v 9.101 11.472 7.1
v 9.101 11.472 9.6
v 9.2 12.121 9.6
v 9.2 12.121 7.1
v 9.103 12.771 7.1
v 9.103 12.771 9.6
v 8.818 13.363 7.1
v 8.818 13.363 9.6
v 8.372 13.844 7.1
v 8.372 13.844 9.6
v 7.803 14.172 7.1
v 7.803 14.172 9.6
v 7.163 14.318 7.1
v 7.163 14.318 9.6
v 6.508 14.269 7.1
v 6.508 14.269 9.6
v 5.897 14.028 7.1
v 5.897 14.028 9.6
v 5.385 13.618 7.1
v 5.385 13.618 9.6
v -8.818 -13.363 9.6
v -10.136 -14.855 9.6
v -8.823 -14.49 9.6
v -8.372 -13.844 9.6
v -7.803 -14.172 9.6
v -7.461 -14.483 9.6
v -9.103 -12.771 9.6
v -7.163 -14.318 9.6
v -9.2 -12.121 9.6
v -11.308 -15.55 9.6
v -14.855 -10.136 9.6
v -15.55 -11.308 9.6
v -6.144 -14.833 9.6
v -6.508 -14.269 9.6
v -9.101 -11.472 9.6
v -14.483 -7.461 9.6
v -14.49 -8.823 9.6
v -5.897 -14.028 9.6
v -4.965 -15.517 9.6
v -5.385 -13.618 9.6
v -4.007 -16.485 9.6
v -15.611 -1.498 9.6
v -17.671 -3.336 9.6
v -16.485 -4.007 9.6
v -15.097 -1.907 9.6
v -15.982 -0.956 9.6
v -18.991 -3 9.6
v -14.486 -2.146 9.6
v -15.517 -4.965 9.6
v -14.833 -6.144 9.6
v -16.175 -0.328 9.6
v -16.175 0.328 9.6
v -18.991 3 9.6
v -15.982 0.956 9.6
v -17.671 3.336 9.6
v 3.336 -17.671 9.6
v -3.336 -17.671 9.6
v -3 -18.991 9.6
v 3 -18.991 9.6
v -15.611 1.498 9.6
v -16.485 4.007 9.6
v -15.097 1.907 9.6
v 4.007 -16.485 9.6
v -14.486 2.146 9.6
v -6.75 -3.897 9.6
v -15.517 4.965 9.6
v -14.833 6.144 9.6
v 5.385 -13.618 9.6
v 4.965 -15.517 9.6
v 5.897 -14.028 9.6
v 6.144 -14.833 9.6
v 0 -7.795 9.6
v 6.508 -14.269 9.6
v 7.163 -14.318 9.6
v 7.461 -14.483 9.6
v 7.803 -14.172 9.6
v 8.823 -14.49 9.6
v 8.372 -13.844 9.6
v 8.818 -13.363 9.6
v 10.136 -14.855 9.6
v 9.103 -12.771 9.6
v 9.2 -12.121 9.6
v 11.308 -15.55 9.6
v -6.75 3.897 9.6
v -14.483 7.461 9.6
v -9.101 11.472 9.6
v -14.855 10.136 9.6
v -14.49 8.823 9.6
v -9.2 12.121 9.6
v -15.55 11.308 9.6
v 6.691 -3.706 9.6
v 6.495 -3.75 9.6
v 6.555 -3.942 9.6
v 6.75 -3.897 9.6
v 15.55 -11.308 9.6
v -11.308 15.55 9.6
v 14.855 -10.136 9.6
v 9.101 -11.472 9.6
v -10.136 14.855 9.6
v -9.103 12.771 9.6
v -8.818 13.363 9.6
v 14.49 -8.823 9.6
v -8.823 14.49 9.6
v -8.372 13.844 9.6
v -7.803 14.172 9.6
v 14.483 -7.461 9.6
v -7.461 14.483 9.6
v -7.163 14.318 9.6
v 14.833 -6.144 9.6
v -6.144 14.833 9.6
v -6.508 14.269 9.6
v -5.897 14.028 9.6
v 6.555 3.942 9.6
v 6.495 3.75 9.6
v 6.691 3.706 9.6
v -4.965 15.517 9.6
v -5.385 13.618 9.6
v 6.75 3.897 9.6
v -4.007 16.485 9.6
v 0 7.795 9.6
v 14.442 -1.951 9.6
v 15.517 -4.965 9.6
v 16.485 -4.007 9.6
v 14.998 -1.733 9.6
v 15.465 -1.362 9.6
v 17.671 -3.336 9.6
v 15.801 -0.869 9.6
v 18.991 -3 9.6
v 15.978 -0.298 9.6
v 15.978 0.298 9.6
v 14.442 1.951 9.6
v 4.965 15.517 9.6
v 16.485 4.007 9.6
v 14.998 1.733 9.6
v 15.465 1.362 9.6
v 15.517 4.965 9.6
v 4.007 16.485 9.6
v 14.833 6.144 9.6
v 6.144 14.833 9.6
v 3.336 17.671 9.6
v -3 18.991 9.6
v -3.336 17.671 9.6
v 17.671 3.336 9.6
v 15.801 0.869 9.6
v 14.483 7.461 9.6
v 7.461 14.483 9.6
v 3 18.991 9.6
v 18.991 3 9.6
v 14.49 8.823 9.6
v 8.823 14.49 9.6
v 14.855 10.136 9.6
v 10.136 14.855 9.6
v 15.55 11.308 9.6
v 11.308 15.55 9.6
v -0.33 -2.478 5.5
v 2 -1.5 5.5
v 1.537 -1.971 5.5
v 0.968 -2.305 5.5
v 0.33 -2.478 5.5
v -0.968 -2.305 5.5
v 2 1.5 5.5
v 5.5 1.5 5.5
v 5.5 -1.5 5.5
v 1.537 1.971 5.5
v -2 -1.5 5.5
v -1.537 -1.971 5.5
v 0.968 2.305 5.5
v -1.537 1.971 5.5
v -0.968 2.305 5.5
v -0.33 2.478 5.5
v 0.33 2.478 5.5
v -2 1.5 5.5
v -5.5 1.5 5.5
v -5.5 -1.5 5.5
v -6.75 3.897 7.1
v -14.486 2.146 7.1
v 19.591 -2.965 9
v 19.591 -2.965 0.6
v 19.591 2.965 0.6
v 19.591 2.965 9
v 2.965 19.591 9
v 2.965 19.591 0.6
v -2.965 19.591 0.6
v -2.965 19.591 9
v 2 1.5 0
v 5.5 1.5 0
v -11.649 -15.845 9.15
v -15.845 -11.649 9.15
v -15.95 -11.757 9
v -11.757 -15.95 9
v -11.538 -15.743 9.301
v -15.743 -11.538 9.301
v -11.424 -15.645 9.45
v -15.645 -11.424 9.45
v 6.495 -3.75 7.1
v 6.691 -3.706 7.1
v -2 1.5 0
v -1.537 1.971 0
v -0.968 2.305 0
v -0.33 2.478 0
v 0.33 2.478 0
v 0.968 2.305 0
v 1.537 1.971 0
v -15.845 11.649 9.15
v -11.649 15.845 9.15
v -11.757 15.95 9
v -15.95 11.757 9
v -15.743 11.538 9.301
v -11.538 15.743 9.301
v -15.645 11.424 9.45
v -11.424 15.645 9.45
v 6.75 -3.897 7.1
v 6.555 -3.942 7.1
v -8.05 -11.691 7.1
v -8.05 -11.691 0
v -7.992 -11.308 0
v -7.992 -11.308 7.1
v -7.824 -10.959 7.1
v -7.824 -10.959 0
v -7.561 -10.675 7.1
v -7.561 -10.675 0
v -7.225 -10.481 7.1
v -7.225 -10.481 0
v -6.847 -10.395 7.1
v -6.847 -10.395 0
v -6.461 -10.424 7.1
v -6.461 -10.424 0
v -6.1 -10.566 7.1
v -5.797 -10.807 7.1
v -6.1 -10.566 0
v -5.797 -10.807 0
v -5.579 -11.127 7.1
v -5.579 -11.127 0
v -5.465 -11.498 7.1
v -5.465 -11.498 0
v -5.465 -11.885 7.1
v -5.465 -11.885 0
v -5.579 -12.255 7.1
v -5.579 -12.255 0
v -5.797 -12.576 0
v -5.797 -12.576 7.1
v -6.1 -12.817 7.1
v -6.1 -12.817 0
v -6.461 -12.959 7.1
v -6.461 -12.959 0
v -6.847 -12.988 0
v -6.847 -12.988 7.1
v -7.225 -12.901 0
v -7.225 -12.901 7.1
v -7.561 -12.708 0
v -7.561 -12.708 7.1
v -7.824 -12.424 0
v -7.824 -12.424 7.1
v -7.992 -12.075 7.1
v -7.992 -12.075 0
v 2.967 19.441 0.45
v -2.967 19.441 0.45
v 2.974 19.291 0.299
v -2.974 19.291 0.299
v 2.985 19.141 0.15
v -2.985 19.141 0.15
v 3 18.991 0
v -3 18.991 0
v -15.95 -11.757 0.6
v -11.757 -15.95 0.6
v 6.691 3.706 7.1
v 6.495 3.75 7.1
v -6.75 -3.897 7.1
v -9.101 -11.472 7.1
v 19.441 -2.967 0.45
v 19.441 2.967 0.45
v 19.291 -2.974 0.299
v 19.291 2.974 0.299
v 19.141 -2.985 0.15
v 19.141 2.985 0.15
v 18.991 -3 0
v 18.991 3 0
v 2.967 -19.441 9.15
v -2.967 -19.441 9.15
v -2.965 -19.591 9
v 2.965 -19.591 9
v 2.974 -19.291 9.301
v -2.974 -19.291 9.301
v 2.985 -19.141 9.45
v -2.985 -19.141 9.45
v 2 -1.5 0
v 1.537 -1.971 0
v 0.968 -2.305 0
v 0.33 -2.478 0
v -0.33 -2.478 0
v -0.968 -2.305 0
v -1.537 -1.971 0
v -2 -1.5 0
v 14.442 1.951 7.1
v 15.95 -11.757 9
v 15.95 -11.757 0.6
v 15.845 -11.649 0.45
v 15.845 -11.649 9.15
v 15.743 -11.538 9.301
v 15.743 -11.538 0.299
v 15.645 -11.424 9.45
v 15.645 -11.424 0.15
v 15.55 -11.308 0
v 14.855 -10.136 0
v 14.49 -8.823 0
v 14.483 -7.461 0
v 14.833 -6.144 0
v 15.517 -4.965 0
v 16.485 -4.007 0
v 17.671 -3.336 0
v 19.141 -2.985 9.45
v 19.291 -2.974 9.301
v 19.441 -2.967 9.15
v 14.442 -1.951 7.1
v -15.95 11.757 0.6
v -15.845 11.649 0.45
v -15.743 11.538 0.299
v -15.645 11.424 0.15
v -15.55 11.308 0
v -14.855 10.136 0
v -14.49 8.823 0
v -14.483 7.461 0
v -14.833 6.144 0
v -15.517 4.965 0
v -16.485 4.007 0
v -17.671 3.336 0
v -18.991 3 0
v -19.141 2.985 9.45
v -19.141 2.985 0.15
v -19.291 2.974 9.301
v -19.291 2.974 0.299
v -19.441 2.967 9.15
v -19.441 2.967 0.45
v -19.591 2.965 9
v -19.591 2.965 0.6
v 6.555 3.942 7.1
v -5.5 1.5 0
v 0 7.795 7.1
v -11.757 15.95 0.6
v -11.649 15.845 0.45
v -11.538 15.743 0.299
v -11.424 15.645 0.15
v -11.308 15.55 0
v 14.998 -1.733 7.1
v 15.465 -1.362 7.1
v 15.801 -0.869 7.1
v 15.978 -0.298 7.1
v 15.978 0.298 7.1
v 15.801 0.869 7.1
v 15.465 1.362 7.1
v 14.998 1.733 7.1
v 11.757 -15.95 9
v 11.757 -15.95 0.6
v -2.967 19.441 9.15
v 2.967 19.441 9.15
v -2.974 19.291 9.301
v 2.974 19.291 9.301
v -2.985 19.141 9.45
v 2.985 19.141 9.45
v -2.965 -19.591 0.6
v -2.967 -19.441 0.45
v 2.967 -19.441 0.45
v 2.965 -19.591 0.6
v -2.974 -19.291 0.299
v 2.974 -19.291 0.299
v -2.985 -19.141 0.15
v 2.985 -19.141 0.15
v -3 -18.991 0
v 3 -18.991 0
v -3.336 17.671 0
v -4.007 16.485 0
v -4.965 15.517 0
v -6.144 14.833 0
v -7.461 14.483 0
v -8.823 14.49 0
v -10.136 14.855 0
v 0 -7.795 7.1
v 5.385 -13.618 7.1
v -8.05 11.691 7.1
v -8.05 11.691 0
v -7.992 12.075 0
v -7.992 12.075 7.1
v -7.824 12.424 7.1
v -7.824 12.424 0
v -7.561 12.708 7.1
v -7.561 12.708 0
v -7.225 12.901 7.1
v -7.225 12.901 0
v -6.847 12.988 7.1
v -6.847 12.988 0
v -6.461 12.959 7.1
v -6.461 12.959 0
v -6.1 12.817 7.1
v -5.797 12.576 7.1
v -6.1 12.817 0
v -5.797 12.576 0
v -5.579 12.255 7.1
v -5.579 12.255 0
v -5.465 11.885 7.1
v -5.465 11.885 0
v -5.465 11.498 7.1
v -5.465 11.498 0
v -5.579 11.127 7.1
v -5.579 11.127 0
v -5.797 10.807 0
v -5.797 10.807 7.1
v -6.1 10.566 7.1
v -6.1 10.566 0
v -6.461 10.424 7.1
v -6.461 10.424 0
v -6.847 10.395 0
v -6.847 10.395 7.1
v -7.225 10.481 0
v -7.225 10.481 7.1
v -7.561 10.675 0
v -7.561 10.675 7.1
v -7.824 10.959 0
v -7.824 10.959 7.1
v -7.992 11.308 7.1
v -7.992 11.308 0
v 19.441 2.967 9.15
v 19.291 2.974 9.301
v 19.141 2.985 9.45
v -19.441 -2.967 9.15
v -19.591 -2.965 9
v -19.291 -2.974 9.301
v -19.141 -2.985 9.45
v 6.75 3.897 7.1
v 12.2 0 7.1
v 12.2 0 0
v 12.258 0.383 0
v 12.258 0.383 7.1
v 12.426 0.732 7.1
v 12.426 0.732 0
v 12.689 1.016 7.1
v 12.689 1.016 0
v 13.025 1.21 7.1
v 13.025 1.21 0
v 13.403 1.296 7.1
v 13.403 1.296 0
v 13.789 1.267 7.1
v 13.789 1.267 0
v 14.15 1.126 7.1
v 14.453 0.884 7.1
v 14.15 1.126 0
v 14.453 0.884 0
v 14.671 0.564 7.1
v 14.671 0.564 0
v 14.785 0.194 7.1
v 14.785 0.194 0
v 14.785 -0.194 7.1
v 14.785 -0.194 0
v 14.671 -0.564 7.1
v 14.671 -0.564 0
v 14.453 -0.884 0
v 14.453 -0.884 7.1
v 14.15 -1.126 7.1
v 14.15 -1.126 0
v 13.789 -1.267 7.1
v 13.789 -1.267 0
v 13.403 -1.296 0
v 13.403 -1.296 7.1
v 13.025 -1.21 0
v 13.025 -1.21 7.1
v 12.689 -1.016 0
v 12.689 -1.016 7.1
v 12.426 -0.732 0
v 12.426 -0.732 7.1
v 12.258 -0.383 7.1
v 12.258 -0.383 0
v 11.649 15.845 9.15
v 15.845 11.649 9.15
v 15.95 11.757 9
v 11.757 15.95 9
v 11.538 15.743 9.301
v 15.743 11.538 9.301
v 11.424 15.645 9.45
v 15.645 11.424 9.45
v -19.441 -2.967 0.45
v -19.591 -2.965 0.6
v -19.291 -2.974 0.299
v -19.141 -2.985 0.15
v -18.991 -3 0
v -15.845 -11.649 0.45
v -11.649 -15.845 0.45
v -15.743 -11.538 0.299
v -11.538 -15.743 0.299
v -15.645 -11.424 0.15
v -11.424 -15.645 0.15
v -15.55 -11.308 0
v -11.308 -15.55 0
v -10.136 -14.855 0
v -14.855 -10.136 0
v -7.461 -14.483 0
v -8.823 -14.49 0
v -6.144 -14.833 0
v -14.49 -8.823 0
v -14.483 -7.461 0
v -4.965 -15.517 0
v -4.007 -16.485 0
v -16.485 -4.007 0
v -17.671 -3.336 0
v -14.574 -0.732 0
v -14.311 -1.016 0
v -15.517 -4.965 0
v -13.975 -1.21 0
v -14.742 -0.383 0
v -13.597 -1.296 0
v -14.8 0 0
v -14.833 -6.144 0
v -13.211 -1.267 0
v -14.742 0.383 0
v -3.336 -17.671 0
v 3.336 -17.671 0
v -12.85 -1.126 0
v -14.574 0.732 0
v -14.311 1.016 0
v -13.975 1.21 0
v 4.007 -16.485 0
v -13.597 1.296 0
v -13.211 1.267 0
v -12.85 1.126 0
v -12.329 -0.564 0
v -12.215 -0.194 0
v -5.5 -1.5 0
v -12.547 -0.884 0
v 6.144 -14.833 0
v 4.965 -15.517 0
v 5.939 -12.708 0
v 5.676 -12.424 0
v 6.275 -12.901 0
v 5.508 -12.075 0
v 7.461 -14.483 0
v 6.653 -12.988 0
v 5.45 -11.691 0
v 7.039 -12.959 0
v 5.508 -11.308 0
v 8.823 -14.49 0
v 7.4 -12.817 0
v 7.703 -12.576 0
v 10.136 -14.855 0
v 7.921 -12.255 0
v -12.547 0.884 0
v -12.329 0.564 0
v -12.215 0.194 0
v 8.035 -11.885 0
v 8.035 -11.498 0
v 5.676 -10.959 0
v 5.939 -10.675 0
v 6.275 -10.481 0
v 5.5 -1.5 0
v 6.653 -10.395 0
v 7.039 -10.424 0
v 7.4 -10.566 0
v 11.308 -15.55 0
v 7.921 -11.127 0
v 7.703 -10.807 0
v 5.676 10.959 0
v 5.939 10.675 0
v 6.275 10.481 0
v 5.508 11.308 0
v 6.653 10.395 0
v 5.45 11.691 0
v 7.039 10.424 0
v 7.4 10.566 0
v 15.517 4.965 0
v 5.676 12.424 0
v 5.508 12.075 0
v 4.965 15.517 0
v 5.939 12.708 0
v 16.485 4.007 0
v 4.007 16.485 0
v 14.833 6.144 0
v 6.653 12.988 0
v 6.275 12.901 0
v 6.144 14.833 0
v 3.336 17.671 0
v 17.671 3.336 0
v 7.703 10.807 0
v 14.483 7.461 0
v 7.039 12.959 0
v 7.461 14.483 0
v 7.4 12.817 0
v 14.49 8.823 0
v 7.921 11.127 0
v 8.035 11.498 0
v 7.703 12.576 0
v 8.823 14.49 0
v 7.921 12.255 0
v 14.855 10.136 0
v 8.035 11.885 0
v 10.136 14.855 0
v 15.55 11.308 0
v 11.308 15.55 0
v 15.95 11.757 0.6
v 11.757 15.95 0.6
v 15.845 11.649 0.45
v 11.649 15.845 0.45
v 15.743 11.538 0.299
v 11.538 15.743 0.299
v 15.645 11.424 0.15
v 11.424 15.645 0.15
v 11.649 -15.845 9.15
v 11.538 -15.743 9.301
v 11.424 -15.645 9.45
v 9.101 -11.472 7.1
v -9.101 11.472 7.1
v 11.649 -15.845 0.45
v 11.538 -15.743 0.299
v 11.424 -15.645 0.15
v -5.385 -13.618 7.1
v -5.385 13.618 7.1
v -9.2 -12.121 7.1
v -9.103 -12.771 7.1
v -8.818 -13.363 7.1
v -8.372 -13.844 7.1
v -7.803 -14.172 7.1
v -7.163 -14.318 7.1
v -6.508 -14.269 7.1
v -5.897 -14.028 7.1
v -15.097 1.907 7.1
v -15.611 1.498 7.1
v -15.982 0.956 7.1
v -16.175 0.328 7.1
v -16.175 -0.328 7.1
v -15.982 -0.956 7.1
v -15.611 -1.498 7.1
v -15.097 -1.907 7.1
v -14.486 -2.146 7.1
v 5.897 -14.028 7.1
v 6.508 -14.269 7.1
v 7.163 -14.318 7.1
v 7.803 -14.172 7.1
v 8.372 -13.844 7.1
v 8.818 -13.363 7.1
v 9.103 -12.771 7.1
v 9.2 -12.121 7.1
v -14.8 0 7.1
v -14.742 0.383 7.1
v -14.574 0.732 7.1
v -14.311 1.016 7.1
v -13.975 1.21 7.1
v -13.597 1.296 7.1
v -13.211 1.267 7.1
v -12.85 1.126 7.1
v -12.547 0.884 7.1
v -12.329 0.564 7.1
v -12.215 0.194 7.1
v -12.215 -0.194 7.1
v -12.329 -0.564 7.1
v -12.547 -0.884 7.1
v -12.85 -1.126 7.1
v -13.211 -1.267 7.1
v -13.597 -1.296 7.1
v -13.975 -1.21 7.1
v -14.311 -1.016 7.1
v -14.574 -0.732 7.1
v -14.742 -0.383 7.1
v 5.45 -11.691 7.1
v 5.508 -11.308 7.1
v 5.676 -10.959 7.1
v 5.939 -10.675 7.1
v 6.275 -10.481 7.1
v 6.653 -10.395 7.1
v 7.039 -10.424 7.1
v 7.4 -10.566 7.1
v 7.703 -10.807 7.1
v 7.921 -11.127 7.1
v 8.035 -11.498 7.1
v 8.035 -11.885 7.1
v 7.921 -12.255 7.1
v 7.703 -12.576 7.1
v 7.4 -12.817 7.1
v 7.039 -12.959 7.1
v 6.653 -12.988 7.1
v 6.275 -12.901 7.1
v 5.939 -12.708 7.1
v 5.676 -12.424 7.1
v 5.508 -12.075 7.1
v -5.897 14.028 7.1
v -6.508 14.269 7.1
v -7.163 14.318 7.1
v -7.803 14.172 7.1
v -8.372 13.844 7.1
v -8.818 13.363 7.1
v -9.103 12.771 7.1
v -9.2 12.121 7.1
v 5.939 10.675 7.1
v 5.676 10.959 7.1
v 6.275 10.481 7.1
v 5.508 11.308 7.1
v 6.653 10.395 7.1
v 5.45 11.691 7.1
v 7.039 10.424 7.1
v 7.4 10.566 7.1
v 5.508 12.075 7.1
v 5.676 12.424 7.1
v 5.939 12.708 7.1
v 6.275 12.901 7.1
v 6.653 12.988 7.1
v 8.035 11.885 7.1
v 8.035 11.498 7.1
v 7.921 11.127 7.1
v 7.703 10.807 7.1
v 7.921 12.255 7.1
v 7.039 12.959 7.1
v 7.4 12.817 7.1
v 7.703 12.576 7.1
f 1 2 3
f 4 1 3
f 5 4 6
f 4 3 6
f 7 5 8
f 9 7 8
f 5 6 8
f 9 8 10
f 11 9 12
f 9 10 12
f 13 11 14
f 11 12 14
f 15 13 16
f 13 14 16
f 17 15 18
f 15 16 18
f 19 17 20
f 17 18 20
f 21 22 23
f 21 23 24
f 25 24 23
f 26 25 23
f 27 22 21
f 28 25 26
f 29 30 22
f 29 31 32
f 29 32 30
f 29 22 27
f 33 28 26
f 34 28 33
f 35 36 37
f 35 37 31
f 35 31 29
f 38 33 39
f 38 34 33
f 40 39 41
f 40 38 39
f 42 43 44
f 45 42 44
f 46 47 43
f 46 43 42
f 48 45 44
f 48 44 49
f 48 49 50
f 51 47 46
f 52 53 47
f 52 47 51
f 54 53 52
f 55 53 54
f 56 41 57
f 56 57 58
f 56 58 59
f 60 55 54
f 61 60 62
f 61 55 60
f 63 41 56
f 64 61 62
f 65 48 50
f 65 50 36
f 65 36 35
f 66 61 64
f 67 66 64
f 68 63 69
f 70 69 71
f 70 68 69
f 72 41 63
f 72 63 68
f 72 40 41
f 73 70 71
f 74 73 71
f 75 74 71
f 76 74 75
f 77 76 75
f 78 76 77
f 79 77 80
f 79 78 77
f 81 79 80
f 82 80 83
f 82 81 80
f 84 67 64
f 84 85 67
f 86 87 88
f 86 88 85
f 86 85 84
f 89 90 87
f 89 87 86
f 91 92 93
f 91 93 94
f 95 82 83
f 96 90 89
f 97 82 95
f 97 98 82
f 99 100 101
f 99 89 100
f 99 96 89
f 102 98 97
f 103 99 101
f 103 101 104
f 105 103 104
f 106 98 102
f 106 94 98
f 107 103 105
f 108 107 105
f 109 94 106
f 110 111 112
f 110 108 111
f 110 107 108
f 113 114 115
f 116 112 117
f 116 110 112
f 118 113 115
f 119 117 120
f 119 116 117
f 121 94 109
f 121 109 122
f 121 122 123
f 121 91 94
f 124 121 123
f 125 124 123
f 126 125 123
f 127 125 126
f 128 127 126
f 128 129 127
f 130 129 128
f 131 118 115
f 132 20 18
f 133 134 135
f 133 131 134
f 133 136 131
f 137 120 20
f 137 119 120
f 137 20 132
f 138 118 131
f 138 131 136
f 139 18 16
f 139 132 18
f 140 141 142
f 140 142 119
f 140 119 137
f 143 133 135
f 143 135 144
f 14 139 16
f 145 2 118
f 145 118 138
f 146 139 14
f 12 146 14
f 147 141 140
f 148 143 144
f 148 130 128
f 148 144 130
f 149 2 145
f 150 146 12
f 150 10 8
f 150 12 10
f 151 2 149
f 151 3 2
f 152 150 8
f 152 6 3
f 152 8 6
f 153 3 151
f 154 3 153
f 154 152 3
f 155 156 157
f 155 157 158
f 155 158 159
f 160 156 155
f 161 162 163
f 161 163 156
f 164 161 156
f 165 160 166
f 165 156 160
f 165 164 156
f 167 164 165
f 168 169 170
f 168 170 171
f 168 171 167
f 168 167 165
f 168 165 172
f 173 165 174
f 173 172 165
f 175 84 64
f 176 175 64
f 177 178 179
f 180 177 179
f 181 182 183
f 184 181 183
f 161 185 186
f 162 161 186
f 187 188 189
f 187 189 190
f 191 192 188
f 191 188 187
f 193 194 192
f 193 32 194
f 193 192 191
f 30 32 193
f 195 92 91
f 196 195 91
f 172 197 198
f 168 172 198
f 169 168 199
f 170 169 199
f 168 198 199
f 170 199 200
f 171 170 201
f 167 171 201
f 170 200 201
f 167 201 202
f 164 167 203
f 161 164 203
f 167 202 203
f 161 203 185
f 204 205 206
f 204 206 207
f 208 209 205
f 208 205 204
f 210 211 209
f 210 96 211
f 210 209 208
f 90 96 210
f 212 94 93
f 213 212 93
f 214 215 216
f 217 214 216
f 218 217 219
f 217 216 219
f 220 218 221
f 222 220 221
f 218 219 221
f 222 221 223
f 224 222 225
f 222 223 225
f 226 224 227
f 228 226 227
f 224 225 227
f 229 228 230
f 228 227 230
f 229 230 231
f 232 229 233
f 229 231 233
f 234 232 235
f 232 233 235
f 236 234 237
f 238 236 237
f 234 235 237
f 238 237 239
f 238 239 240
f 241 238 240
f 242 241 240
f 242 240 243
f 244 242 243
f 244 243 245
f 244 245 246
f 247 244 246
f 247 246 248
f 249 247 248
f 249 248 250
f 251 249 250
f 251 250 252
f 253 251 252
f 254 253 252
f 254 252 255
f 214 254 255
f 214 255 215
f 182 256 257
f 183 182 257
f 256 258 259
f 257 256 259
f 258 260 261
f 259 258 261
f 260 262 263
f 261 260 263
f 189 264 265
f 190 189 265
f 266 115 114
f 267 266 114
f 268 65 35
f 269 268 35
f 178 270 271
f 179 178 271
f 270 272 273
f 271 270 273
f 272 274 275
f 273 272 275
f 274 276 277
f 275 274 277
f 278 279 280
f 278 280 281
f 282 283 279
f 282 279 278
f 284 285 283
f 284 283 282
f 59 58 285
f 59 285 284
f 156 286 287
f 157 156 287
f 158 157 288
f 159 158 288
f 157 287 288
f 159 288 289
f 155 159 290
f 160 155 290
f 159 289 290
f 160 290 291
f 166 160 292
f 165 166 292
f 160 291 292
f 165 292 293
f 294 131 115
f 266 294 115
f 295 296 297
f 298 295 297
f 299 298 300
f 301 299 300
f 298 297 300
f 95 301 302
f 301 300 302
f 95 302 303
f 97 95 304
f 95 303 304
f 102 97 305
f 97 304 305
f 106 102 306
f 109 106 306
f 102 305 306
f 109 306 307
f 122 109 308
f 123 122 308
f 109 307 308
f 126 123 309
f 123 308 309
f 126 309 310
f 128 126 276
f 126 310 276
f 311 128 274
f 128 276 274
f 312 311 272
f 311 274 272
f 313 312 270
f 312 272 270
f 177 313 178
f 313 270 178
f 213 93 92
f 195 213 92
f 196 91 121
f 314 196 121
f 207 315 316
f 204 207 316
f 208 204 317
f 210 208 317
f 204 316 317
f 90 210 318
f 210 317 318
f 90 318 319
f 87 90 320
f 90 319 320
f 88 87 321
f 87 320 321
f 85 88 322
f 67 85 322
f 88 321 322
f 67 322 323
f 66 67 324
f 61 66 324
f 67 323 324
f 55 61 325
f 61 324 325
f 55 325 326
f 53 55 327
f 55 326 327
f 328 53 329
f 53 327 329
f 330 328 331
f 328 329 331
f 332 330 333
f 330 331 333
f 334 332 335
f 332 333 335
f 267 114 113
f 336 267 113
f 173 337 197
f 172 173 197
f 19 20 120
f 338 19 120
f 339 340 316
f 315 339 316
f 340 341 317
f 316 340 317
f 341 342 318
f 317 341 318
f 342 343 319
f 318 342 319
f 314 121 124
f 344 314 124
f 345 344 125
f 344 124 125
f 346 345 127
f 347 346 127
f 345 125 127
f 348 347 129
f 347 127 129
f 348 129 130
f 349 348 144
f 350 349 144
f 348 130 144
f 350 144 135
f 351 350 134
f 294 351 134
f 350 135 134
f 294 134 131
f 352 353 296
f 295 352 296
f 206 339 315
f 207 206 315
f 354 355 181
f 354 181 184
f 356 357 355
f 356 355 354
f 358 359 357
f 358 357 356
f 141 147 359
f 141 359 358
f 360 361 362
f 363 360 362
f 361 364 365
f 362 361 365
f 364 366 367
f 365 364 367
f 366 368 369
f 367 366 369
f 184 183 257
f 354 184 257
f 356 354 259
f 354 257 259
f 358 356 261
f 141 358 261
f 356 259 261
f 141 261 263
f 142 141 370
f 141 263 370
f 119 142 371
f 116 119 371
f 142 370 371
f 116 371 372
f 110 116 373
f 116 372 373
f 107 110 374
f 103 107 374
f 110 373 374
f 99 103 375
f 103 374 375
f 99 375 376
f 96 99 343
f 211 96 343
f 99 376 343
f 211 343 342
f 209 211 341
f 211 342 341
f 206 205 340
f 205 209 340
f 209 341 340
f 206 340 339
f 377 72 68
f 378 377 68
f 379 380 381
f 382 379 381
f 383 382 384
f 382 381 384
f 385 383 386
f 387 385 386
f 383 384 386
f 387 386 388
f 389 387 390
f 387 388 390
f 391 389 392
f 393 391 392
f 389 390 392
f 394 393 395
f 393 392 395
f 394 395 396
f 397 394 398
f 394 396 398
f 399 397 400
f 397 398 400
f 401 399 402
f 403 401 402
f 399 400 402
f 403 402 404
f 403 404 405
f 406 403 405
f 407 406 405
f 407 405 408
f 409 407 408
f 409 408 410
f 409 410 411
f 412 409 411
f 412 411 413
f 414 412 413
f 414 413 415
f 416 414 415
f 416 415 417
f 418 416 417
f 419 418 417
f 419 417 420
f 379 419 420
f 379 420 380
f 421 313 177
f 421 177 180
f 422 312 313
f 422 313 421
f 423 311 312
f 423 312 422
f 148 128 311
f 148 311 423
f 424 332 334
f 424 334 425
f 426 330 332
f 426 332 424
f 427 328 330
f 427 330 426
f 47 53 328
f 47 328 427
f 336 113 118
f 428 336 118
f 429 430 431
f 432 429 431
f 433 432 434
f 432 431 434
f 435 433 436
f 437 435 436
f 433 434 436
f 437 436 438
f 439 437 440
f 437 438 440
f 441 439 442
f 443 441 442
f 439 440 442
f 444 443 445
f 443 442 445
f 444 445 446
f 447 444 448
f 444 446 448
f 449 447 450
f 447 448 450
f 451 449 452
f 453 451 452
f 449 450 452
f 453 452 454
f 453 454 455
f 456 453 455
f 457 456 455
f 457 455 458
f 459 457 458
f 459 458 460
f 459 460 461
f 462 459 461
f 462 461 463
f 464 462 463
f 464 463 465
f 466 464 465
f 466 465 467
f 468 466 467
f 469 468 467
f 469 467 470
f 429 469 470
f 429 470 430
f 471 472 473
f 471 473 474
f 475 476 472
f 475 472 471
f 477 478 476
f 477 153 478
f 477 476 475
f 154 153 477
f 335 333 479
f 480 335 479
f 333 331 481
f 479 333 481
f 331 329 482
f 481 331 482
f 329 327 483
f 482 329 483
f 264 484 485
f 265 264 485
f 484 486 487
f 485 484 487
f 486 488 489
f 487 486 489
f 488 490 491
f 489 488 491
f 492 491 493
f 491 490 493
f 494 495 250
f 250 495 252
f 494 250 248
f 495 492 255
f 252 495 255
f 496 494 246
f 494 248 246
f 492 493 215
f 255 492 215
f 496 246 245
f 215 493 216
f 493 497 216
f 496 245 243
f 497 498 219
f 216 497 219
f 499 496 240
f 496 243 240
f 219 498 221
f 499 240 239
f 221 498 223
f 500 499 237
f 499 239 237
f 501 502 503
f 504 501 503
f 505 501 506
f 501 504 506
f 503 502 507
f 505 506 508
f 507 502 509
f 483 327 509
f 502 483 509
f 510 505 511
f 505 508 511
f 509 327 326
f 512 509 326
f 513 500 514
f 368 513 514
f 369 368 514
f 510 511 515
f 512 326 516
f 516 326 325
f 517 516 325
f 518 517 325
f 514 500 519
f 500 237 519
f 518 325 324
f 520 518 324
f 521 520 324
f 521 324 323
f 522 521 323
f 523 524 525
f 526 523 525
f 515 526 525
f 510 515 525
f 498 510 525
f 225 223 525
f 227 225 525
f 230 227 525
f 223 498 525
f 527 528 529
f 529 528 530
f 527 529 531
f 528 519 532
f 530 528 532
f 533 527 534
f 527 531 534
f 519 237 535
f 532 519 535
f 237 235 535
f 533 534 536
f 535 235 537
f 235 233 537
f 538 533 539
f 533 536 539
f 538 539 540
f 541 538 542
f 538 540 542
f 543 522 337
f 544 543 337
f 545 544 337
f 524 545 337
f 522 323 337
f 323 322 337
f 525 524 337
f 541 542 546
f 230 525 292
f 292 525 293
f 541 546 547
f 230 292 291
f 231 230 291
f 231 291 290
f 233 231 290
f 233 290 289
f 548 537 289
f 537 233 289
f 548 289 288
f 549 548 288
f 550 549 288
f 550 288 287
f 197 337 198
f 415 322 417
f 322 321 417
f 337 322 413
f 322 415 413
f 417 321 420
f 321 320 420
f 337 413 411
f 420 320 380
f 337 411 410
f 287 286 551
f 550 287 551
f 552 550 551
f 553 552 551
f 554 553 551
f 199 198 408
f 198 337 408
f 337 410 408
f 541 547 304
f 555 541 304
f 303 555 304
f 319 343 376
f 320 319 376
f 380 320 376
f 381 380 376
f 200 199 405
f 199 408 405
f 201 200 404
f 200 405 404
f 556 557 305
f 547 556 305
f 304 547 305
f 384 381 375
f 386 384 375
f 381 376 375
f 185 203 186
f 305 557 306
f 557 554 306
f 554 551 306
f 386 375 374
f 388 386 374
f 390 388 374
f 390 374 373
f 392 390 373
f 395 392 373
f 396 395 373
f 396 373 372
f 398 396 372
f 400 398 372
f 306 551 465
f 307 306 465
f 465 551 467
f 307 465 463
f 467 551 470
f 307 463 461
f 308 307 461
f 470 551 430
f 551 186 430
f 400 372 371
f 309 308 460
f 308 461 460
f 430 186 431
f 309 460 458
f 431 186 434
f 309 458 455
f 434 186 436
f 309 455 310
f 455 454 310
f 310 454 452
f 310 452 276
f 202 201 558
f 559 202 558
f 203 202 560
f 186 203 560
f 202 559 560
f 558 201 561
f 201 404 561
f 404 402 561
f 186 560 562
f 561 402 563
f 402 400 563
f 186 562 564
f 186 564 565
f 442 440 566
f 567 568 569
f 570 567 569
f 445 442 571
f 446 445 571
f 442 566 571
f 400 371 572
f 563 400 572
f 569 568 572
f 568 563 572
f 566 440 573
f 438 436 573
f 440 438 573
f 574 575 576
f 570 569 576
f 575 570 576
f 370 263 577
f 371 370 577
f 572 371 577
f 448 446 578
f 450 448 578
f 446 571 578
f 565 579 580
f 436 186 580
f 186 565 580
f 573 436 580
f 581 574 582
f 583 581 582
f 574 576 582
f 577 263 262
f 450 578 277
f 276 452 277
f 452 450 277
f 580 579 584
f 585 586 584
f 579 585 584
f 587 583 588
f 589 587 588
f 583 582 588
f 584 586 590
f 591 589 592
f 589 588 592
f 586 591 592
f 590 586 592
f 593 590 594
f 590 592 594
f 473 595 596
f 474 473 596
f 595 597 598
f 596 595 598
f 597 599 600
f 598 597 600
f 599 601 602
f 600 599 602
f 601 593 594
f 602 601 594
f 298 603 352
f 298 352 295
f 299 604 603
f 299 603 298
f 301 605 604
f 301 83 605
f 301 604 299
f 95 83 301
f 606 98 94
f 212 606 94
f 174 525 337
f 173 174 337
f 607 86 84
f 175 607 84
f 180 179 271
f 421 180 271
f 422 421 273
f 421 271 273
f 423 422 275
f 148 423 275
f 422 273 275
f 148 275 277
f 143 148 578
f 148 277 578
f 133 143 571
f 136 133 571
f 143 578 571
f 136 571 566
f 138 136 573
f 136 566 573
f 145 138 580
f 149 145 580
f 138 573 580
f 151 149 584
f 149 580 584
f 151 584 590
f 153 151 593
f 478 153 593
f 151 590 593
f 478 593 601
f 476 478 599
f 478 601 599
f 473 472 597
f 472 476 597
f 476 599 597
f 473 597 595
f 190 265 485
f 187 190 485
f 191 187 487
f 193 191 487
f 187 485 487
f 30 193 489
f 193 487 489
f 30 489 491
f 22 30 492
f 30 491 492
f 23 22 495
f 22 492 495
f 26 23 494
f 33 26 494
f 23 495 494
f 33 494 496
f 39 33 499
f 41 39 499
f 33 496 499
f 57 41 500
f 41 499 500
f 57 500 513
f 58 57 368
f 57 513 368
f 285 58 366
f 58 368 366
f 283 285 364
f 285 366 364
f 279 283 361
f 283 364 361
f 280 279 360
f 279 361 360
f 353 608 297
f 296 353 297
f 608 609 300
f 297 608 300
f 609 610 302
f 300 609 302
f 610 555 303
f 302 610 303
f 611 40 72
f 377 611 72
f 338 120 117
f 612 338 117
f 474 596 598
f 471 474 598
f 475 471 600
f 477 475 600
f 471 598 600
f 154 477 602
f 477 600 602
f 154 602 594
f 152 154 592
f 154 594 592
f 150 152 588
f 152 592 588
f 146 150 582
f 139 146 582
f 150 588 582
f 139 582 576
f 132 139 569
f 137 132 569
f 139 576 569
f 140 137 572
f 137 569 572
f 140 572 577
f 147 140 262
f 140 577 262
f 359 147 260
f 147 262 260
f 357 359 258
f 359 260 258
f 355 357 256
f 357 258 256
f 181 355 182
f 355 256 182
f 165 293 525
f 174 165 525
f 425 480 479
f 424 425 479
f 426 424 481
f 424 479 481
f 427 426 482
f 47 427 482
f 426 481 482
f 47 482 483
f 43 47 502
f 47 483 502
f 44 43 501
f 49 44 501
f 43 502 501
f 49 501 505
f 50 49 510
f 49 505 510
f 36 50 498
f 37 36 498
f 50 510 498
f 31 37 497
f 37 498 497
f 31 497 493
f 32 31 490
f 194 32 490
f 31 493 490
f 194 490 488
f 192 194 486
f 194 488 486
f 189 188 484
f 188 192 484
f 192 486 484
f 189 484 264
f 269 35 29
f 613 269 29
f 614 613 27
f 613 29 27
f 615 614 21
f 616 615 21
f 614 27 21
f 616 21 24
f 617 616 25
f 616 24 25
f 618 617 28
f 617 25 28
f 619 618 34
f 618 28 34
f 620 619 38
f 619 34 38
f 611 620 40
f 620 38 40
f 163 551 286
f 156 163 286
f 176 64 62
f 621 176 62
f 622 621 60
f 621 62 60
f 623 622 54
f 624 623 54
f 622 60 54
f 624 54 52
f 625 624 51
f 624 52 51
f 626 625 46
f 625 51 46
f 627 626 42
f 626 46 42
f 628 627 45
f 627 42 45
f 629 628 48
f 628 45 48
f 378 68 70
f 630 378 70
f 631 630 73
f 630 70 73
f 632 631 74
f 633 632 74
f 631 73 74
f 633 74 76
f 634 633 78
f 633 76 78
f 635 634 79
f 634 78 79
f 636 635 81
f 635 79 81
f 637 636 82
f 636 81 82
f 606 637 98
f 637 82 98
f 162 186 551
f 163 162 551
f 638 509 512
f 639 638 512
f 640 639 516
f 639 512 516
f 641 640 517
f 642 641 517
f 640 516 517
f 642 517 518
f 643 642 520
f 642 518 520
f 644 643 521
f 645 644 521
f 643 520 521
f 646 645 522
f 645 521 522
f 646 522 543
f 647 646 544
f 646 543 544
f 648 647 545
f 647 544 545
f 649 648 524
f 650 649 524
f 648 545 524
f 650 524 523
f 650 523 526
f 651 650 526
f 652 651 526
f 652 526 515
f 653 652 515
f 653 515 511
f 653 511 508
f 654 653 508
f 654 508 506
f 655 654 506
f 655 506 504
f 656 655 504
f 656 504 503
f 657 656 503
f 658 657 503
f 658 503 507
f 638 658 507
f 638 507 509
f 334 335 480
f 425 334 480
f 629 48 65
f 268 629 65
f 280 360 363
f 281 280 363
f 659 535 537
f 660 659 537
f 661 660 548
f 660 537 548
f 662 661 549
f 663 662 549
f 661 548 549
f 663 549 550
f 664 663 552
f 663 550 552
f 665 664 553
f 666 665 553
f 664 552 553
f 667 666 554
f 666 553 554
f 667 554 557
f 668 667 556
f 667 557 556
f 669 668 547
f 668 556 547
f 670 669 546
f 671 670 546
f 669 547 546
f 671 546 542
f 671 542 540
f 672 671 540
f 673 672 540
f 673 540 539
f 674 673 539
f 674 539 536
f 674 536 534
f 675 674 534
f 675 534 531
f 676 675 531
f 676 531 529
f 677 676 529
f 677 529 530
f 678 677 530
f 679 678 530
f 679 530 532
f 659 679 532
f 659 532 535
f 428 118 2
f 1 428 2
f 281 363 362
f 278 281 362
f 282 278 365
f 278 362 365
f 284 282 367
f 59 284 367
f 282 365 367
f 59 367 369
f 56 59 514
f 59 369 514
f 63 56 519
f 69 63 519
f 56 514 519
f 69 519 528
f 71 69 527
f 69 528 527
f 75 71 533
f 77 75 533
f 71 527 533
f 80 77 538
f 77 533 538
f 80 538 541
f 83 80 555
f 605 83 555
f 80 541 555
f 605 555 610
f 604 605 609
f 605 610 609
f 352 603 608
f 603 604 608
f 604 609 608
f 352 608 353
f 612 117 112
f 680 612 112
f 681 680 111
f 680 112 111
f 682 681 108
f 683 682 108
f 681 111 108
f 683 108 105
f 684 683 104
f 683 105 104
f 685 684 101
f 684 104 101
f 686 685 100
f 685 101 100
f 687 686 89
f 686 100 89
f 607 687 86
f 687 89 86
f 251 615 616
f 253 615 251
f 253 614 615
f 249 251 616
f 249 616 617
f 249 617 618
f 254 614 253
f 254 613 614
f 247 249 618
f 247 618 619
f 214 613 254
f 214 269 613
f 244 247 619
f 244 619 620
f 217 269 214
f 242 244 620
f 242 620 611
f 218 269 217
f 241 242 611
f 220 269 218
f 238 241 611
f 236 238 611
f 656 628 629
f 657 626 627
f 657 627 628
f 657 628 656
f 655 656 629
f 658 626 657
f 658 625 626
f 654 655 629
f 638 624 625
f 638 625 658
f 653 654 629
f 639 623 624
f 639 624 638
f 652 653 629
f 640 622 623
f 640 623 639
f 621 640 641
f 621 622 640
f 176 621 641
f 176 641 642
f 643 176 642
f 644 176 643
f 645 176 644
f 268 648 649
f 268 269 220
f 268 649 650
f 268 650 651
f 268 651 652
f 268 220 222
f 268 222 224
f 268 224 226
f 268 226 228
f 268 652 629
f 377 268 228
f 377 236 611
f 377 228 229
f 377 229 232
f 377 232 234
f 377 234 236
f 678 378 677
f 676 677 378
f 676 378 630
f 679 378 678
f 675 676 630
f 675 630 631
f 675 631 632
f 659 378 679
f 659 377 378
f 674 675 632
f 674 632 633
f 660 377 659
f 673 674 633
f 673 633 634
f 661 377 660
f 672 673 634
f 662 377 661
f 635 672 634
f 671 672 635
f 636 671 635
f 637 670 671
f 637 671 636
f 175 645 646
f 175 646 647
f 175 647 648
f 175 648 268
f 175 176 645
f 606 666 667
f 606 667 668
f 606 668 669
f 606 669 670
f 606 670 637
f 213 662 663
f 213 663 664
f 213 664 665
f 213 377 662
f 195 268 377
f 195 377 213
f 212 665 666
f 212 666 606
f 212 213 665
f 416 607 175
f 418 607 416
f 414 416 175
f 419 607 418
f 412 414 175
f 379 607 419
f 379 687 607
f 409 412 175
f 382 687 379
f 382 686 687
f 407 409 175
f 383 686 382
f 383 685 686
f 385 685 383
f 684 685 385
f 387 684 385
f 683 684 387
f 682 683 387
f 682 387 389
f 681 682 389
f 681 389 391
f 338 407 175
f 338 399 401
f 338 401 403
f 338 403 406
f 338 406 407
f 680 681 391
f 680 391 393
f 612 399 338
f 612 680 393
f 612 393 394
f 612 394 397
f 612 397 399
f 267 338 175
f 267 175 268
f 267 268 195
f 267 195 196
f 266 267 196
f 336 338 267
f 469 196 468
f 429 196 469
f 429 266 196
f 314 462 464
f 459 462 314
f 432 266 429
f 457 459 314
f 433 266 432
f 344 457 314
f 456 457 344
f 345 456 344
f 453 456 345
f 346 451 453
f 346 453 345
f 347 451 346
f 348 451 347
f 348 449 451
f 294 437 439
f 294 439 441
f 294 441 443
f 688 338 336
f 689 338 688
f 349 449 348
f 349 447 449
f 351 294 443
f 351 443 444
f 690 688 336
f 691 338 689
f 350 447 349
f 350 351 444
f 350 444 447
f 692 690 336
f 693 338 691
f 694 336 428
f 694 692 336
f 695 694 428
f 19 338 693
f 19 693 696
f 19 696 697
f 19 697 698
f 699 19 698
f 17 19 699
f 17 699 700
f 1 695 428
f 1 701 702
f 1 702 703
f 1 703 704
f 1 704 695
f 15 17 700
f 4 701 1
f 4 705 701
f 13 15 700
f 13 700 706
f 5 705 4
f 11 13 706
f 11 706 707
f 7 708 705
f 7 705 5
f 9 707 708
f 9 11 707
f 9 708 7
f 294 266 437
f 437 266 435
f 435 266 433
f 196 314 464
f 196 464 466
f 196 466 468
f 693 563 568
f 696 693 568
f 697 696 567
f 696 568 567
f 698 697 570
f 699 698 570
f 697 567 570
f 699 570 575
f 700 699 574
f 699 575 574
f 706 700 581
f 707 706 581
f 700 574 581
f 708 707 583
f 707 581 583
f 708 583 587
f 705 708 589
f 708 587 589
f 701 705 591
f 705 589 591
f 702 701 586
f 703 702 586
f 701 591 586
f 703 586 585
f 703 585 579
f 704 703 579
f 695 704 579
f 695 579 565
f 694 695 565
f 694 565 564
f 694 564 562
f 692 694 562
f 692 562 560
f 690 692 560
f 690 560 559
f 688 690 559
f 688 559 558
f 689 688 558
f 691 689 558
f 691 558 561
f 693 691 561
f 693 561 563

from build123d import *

# Parameters (mm, degrees)
BOSS_EXTRUDE1_DEPTH  = 9.6
CHAMFER2_SIZE        = 0.6
CUT_EXTRUDE2_DEPTH   = 2.5
M2_CLEARANCE_HOLE1_D = 2.6
CUT_EXTRUDE3_START   = -9.6
CUT_EXTRUDE3_DEPTH   = 5.5


with BuildPart() as part:
    # Sketch1 → Boss-Extrude1 (new body)
    with BuildSketch(Plane.XY):
        with BuildLine():
            ThreePointArc((-11.756599923, -15.949743136), (-6.144180323, -14.833363466), (-2.965, -19.591343059))
            Line((-2.965, -19.591343059), (2.965, -19.591343059))
            ThreePointArc((2.965, -19.591343059), (6.144180323, -14.833363466), (11.756599923, -15.949743136))
            Line((11.756599923, -15.949743136), (15.949743136, -11.756599923))
            ThreePointArc((15.949743136, -11.756599923), (14.833363466, -6.144180323), (19.591343059, -2.965))
            Line((19.591343059, -2.965), (19.591343059, 2.965))
            ThreePointArc((19.591343059, 2.965), (14.833363466, 6.144180323), (15.949743136, 11.756599923))
            Line((15.949743136, 11.756599923), (11.756599923, 15.949743136))
            ThreePointArc((11.756599923, 15.949743136), (6.144180323, 14.833363466), (2.965, 19.591343059))
            Line((2.965, 19.591343059), (-2.965, 19.591343059))
            ThreePointArc((-2.965, 19.591343059), (-6.144180323, 14.833363466), (-11.756599923, 15.949743136))
            Line((-11.756599923, 15.949743136), (-15.949743136, 11.756599923))
            ThreePointArc((-15.949743136, 11.756599923), (-14.833363466, 6.144180323), (-19.591343059, 2.965))
            Line((-19.591343059, 2.965), (-19.591343059, -2.965))
            ThreePointArc((-19.591343059, -2.965), (-14.833363466, -6.144180323), (-15.949743136, -11.756599923))
            Line((-15.949743136, -11.756599923), (-11.756599923, -15.949743136))
        make_face()
    extrude(amount=BOSS_EXTRUDE1_DEPTH)

    # Chamfer2
    chamfer2_edges = [part.edges().sort_by_distance(p)[0] for p in [
        (-19.591343059, 0, 9.6),
        (-13.853171529, 13.853171529, 0),
        (0, 19.591343059, 0),
        (13.853171529, 13.853171529, 0),
        (19.591343059, 0, 0),
        (-13.853171529, -13.853171529, 9.6),
        (13.853171529, -13.853171529, 0),
        (0, -19.591343059, 0),
        (-13.853171529, -13.853171529, 0),
        (-19.591343059, 0, 0),
        (0, -19.591343059, 9.6),
        (13.853171529, -13.853171529, 9.6),
        (19.591343059, 0, 9.6),
        (13.853171529, 13.853171529, 9.6),
        (0, 19.591343059, 9.6),
        (-13.853171529, 13.853171529, 9.6),
    ]]
    chamfer(chamfer2_edges, length=CHAMFER2_SIZE)

    # Sketch4 → Cut-Extrude2 (cut)
    with BuildSketch(Plane.XY.offset(9.6)):
        with BuildLine():
            ThreePointArc((14.441692106, -1.95061736), (16, 0), (14.441692106, 1.95061736))
            Line((14.441692106, 1.95061736), (6.69085075, 3.70569527))
            Line((6.69085075, 3.70569527), (6.495190528, 3.75))
            Line((6.495190528, 3.75), (6.554651618, 3.941599088))
            Line((6.554651618, 3.941599088), (6.750311839, 3.897294358))
            Line((6.750311839, 3.897294358), (9.101143263, 11.472284348))
            ThreePointArc((9.101143263, 11.472284348), (8.1, 14.029611541), (5.384718053, 13.617963443))
            Line((5.384718053, 13.617963443), (0, 7.794588715))
            Line((0, 7.794588715), (-5.384718053, 13.617963443))
            ThreePointArc((-5.384718053, 13.617963443), (-8.1, 14.029611541), (-9.101143263, 11.472284348))
            Line((-9.101143263, 11.472284348), (-6.750311839, 3.897294358))
            Line((-6.750311839, 3.897294358), (-14.485861316, 2.145679096))
            ThreePointArc((-14.485861316, 2.145679096), (-16.2, 0), (-14.485861316, -2.145679096))
            Line((-14.485861316, -2.145679096), (-6.750311839, -3.897294358))
            Line((-6.750311839, -3.897294358), (-9.101143263, -11.472284348))
            ThreePointArc((-9.101143263, -11.472284348), (-8.1, -14.029611541), (-5.384718053, -13.617963443))
            Line((-5.384718053, -13.617963443), (0, -7.794588715))
            Line((0, -7.794588715), (5.384718053, -13.617963443))
            ThreePointArc((5.384718053, -13.617963443), (8.1, -14.029611541), (9.101143263, -11.472284348))
            Line((9.101143263, -11.472284348), (6.750311839, -3.897294358))
            Line((6.750311839, -3.897294358), (6.554651618, -3.941599088))
            Line((6.554651618, -3.941599088), (6.495190528, -3.75))
            Line((6.495190528, -3.75), (6.69085075, -3.70569527))
            Line((6.69085075, -3.70569527), (14.441692106, -1.95061736))
        make_face()
    extrude(amount=-CUT_EXTRUDE2_DEPTH, mode=Mode.SUBTRACT)

    # M2 Clearance Hole1 (through all)
    with Locations(Plane.XY.offset(7.1)):
        with Locations((13.5, 0), (6.75, -11.691342951), (-6.75, -11.691342951), (-13.5, 0), (-6.75, 11.691342951), (6.75, 11.691342951)):
            Hole(M2_CLEARANCE_HOLE1_D / 2)

    # Sketch3<2> → Cut-Extrude3 (cut)
    with BuildSketch(Plane.XY.offset(9.6).offset(CUT_EXTRUDE3_START)):
        with BuildLine():
            Line((-2, -1.5), (-5.5, -1.5))
            Line((-5.5, -1.5), (-5.5, 1.5))
            Line((-5.5, 1.5), (-2, 1.5))
            ThreePointArc((-2, 1.5), (0, 2.5), (2, 1.5))
            Line((2, 1.5), (5.5, 1.5))
            Line((5.5, 1.5), (5.5, -1.5))
            Line((5.5, -1.5), (2, -1.5))
            ThreePointArc((2, -1.5), (0, -2.5), (-2, -1.5))
        make_face()
    extrude(amount=CUT_EXTRUDE3_DEPTH, mode=Mode.SUBTRACT)


solid = part.part
